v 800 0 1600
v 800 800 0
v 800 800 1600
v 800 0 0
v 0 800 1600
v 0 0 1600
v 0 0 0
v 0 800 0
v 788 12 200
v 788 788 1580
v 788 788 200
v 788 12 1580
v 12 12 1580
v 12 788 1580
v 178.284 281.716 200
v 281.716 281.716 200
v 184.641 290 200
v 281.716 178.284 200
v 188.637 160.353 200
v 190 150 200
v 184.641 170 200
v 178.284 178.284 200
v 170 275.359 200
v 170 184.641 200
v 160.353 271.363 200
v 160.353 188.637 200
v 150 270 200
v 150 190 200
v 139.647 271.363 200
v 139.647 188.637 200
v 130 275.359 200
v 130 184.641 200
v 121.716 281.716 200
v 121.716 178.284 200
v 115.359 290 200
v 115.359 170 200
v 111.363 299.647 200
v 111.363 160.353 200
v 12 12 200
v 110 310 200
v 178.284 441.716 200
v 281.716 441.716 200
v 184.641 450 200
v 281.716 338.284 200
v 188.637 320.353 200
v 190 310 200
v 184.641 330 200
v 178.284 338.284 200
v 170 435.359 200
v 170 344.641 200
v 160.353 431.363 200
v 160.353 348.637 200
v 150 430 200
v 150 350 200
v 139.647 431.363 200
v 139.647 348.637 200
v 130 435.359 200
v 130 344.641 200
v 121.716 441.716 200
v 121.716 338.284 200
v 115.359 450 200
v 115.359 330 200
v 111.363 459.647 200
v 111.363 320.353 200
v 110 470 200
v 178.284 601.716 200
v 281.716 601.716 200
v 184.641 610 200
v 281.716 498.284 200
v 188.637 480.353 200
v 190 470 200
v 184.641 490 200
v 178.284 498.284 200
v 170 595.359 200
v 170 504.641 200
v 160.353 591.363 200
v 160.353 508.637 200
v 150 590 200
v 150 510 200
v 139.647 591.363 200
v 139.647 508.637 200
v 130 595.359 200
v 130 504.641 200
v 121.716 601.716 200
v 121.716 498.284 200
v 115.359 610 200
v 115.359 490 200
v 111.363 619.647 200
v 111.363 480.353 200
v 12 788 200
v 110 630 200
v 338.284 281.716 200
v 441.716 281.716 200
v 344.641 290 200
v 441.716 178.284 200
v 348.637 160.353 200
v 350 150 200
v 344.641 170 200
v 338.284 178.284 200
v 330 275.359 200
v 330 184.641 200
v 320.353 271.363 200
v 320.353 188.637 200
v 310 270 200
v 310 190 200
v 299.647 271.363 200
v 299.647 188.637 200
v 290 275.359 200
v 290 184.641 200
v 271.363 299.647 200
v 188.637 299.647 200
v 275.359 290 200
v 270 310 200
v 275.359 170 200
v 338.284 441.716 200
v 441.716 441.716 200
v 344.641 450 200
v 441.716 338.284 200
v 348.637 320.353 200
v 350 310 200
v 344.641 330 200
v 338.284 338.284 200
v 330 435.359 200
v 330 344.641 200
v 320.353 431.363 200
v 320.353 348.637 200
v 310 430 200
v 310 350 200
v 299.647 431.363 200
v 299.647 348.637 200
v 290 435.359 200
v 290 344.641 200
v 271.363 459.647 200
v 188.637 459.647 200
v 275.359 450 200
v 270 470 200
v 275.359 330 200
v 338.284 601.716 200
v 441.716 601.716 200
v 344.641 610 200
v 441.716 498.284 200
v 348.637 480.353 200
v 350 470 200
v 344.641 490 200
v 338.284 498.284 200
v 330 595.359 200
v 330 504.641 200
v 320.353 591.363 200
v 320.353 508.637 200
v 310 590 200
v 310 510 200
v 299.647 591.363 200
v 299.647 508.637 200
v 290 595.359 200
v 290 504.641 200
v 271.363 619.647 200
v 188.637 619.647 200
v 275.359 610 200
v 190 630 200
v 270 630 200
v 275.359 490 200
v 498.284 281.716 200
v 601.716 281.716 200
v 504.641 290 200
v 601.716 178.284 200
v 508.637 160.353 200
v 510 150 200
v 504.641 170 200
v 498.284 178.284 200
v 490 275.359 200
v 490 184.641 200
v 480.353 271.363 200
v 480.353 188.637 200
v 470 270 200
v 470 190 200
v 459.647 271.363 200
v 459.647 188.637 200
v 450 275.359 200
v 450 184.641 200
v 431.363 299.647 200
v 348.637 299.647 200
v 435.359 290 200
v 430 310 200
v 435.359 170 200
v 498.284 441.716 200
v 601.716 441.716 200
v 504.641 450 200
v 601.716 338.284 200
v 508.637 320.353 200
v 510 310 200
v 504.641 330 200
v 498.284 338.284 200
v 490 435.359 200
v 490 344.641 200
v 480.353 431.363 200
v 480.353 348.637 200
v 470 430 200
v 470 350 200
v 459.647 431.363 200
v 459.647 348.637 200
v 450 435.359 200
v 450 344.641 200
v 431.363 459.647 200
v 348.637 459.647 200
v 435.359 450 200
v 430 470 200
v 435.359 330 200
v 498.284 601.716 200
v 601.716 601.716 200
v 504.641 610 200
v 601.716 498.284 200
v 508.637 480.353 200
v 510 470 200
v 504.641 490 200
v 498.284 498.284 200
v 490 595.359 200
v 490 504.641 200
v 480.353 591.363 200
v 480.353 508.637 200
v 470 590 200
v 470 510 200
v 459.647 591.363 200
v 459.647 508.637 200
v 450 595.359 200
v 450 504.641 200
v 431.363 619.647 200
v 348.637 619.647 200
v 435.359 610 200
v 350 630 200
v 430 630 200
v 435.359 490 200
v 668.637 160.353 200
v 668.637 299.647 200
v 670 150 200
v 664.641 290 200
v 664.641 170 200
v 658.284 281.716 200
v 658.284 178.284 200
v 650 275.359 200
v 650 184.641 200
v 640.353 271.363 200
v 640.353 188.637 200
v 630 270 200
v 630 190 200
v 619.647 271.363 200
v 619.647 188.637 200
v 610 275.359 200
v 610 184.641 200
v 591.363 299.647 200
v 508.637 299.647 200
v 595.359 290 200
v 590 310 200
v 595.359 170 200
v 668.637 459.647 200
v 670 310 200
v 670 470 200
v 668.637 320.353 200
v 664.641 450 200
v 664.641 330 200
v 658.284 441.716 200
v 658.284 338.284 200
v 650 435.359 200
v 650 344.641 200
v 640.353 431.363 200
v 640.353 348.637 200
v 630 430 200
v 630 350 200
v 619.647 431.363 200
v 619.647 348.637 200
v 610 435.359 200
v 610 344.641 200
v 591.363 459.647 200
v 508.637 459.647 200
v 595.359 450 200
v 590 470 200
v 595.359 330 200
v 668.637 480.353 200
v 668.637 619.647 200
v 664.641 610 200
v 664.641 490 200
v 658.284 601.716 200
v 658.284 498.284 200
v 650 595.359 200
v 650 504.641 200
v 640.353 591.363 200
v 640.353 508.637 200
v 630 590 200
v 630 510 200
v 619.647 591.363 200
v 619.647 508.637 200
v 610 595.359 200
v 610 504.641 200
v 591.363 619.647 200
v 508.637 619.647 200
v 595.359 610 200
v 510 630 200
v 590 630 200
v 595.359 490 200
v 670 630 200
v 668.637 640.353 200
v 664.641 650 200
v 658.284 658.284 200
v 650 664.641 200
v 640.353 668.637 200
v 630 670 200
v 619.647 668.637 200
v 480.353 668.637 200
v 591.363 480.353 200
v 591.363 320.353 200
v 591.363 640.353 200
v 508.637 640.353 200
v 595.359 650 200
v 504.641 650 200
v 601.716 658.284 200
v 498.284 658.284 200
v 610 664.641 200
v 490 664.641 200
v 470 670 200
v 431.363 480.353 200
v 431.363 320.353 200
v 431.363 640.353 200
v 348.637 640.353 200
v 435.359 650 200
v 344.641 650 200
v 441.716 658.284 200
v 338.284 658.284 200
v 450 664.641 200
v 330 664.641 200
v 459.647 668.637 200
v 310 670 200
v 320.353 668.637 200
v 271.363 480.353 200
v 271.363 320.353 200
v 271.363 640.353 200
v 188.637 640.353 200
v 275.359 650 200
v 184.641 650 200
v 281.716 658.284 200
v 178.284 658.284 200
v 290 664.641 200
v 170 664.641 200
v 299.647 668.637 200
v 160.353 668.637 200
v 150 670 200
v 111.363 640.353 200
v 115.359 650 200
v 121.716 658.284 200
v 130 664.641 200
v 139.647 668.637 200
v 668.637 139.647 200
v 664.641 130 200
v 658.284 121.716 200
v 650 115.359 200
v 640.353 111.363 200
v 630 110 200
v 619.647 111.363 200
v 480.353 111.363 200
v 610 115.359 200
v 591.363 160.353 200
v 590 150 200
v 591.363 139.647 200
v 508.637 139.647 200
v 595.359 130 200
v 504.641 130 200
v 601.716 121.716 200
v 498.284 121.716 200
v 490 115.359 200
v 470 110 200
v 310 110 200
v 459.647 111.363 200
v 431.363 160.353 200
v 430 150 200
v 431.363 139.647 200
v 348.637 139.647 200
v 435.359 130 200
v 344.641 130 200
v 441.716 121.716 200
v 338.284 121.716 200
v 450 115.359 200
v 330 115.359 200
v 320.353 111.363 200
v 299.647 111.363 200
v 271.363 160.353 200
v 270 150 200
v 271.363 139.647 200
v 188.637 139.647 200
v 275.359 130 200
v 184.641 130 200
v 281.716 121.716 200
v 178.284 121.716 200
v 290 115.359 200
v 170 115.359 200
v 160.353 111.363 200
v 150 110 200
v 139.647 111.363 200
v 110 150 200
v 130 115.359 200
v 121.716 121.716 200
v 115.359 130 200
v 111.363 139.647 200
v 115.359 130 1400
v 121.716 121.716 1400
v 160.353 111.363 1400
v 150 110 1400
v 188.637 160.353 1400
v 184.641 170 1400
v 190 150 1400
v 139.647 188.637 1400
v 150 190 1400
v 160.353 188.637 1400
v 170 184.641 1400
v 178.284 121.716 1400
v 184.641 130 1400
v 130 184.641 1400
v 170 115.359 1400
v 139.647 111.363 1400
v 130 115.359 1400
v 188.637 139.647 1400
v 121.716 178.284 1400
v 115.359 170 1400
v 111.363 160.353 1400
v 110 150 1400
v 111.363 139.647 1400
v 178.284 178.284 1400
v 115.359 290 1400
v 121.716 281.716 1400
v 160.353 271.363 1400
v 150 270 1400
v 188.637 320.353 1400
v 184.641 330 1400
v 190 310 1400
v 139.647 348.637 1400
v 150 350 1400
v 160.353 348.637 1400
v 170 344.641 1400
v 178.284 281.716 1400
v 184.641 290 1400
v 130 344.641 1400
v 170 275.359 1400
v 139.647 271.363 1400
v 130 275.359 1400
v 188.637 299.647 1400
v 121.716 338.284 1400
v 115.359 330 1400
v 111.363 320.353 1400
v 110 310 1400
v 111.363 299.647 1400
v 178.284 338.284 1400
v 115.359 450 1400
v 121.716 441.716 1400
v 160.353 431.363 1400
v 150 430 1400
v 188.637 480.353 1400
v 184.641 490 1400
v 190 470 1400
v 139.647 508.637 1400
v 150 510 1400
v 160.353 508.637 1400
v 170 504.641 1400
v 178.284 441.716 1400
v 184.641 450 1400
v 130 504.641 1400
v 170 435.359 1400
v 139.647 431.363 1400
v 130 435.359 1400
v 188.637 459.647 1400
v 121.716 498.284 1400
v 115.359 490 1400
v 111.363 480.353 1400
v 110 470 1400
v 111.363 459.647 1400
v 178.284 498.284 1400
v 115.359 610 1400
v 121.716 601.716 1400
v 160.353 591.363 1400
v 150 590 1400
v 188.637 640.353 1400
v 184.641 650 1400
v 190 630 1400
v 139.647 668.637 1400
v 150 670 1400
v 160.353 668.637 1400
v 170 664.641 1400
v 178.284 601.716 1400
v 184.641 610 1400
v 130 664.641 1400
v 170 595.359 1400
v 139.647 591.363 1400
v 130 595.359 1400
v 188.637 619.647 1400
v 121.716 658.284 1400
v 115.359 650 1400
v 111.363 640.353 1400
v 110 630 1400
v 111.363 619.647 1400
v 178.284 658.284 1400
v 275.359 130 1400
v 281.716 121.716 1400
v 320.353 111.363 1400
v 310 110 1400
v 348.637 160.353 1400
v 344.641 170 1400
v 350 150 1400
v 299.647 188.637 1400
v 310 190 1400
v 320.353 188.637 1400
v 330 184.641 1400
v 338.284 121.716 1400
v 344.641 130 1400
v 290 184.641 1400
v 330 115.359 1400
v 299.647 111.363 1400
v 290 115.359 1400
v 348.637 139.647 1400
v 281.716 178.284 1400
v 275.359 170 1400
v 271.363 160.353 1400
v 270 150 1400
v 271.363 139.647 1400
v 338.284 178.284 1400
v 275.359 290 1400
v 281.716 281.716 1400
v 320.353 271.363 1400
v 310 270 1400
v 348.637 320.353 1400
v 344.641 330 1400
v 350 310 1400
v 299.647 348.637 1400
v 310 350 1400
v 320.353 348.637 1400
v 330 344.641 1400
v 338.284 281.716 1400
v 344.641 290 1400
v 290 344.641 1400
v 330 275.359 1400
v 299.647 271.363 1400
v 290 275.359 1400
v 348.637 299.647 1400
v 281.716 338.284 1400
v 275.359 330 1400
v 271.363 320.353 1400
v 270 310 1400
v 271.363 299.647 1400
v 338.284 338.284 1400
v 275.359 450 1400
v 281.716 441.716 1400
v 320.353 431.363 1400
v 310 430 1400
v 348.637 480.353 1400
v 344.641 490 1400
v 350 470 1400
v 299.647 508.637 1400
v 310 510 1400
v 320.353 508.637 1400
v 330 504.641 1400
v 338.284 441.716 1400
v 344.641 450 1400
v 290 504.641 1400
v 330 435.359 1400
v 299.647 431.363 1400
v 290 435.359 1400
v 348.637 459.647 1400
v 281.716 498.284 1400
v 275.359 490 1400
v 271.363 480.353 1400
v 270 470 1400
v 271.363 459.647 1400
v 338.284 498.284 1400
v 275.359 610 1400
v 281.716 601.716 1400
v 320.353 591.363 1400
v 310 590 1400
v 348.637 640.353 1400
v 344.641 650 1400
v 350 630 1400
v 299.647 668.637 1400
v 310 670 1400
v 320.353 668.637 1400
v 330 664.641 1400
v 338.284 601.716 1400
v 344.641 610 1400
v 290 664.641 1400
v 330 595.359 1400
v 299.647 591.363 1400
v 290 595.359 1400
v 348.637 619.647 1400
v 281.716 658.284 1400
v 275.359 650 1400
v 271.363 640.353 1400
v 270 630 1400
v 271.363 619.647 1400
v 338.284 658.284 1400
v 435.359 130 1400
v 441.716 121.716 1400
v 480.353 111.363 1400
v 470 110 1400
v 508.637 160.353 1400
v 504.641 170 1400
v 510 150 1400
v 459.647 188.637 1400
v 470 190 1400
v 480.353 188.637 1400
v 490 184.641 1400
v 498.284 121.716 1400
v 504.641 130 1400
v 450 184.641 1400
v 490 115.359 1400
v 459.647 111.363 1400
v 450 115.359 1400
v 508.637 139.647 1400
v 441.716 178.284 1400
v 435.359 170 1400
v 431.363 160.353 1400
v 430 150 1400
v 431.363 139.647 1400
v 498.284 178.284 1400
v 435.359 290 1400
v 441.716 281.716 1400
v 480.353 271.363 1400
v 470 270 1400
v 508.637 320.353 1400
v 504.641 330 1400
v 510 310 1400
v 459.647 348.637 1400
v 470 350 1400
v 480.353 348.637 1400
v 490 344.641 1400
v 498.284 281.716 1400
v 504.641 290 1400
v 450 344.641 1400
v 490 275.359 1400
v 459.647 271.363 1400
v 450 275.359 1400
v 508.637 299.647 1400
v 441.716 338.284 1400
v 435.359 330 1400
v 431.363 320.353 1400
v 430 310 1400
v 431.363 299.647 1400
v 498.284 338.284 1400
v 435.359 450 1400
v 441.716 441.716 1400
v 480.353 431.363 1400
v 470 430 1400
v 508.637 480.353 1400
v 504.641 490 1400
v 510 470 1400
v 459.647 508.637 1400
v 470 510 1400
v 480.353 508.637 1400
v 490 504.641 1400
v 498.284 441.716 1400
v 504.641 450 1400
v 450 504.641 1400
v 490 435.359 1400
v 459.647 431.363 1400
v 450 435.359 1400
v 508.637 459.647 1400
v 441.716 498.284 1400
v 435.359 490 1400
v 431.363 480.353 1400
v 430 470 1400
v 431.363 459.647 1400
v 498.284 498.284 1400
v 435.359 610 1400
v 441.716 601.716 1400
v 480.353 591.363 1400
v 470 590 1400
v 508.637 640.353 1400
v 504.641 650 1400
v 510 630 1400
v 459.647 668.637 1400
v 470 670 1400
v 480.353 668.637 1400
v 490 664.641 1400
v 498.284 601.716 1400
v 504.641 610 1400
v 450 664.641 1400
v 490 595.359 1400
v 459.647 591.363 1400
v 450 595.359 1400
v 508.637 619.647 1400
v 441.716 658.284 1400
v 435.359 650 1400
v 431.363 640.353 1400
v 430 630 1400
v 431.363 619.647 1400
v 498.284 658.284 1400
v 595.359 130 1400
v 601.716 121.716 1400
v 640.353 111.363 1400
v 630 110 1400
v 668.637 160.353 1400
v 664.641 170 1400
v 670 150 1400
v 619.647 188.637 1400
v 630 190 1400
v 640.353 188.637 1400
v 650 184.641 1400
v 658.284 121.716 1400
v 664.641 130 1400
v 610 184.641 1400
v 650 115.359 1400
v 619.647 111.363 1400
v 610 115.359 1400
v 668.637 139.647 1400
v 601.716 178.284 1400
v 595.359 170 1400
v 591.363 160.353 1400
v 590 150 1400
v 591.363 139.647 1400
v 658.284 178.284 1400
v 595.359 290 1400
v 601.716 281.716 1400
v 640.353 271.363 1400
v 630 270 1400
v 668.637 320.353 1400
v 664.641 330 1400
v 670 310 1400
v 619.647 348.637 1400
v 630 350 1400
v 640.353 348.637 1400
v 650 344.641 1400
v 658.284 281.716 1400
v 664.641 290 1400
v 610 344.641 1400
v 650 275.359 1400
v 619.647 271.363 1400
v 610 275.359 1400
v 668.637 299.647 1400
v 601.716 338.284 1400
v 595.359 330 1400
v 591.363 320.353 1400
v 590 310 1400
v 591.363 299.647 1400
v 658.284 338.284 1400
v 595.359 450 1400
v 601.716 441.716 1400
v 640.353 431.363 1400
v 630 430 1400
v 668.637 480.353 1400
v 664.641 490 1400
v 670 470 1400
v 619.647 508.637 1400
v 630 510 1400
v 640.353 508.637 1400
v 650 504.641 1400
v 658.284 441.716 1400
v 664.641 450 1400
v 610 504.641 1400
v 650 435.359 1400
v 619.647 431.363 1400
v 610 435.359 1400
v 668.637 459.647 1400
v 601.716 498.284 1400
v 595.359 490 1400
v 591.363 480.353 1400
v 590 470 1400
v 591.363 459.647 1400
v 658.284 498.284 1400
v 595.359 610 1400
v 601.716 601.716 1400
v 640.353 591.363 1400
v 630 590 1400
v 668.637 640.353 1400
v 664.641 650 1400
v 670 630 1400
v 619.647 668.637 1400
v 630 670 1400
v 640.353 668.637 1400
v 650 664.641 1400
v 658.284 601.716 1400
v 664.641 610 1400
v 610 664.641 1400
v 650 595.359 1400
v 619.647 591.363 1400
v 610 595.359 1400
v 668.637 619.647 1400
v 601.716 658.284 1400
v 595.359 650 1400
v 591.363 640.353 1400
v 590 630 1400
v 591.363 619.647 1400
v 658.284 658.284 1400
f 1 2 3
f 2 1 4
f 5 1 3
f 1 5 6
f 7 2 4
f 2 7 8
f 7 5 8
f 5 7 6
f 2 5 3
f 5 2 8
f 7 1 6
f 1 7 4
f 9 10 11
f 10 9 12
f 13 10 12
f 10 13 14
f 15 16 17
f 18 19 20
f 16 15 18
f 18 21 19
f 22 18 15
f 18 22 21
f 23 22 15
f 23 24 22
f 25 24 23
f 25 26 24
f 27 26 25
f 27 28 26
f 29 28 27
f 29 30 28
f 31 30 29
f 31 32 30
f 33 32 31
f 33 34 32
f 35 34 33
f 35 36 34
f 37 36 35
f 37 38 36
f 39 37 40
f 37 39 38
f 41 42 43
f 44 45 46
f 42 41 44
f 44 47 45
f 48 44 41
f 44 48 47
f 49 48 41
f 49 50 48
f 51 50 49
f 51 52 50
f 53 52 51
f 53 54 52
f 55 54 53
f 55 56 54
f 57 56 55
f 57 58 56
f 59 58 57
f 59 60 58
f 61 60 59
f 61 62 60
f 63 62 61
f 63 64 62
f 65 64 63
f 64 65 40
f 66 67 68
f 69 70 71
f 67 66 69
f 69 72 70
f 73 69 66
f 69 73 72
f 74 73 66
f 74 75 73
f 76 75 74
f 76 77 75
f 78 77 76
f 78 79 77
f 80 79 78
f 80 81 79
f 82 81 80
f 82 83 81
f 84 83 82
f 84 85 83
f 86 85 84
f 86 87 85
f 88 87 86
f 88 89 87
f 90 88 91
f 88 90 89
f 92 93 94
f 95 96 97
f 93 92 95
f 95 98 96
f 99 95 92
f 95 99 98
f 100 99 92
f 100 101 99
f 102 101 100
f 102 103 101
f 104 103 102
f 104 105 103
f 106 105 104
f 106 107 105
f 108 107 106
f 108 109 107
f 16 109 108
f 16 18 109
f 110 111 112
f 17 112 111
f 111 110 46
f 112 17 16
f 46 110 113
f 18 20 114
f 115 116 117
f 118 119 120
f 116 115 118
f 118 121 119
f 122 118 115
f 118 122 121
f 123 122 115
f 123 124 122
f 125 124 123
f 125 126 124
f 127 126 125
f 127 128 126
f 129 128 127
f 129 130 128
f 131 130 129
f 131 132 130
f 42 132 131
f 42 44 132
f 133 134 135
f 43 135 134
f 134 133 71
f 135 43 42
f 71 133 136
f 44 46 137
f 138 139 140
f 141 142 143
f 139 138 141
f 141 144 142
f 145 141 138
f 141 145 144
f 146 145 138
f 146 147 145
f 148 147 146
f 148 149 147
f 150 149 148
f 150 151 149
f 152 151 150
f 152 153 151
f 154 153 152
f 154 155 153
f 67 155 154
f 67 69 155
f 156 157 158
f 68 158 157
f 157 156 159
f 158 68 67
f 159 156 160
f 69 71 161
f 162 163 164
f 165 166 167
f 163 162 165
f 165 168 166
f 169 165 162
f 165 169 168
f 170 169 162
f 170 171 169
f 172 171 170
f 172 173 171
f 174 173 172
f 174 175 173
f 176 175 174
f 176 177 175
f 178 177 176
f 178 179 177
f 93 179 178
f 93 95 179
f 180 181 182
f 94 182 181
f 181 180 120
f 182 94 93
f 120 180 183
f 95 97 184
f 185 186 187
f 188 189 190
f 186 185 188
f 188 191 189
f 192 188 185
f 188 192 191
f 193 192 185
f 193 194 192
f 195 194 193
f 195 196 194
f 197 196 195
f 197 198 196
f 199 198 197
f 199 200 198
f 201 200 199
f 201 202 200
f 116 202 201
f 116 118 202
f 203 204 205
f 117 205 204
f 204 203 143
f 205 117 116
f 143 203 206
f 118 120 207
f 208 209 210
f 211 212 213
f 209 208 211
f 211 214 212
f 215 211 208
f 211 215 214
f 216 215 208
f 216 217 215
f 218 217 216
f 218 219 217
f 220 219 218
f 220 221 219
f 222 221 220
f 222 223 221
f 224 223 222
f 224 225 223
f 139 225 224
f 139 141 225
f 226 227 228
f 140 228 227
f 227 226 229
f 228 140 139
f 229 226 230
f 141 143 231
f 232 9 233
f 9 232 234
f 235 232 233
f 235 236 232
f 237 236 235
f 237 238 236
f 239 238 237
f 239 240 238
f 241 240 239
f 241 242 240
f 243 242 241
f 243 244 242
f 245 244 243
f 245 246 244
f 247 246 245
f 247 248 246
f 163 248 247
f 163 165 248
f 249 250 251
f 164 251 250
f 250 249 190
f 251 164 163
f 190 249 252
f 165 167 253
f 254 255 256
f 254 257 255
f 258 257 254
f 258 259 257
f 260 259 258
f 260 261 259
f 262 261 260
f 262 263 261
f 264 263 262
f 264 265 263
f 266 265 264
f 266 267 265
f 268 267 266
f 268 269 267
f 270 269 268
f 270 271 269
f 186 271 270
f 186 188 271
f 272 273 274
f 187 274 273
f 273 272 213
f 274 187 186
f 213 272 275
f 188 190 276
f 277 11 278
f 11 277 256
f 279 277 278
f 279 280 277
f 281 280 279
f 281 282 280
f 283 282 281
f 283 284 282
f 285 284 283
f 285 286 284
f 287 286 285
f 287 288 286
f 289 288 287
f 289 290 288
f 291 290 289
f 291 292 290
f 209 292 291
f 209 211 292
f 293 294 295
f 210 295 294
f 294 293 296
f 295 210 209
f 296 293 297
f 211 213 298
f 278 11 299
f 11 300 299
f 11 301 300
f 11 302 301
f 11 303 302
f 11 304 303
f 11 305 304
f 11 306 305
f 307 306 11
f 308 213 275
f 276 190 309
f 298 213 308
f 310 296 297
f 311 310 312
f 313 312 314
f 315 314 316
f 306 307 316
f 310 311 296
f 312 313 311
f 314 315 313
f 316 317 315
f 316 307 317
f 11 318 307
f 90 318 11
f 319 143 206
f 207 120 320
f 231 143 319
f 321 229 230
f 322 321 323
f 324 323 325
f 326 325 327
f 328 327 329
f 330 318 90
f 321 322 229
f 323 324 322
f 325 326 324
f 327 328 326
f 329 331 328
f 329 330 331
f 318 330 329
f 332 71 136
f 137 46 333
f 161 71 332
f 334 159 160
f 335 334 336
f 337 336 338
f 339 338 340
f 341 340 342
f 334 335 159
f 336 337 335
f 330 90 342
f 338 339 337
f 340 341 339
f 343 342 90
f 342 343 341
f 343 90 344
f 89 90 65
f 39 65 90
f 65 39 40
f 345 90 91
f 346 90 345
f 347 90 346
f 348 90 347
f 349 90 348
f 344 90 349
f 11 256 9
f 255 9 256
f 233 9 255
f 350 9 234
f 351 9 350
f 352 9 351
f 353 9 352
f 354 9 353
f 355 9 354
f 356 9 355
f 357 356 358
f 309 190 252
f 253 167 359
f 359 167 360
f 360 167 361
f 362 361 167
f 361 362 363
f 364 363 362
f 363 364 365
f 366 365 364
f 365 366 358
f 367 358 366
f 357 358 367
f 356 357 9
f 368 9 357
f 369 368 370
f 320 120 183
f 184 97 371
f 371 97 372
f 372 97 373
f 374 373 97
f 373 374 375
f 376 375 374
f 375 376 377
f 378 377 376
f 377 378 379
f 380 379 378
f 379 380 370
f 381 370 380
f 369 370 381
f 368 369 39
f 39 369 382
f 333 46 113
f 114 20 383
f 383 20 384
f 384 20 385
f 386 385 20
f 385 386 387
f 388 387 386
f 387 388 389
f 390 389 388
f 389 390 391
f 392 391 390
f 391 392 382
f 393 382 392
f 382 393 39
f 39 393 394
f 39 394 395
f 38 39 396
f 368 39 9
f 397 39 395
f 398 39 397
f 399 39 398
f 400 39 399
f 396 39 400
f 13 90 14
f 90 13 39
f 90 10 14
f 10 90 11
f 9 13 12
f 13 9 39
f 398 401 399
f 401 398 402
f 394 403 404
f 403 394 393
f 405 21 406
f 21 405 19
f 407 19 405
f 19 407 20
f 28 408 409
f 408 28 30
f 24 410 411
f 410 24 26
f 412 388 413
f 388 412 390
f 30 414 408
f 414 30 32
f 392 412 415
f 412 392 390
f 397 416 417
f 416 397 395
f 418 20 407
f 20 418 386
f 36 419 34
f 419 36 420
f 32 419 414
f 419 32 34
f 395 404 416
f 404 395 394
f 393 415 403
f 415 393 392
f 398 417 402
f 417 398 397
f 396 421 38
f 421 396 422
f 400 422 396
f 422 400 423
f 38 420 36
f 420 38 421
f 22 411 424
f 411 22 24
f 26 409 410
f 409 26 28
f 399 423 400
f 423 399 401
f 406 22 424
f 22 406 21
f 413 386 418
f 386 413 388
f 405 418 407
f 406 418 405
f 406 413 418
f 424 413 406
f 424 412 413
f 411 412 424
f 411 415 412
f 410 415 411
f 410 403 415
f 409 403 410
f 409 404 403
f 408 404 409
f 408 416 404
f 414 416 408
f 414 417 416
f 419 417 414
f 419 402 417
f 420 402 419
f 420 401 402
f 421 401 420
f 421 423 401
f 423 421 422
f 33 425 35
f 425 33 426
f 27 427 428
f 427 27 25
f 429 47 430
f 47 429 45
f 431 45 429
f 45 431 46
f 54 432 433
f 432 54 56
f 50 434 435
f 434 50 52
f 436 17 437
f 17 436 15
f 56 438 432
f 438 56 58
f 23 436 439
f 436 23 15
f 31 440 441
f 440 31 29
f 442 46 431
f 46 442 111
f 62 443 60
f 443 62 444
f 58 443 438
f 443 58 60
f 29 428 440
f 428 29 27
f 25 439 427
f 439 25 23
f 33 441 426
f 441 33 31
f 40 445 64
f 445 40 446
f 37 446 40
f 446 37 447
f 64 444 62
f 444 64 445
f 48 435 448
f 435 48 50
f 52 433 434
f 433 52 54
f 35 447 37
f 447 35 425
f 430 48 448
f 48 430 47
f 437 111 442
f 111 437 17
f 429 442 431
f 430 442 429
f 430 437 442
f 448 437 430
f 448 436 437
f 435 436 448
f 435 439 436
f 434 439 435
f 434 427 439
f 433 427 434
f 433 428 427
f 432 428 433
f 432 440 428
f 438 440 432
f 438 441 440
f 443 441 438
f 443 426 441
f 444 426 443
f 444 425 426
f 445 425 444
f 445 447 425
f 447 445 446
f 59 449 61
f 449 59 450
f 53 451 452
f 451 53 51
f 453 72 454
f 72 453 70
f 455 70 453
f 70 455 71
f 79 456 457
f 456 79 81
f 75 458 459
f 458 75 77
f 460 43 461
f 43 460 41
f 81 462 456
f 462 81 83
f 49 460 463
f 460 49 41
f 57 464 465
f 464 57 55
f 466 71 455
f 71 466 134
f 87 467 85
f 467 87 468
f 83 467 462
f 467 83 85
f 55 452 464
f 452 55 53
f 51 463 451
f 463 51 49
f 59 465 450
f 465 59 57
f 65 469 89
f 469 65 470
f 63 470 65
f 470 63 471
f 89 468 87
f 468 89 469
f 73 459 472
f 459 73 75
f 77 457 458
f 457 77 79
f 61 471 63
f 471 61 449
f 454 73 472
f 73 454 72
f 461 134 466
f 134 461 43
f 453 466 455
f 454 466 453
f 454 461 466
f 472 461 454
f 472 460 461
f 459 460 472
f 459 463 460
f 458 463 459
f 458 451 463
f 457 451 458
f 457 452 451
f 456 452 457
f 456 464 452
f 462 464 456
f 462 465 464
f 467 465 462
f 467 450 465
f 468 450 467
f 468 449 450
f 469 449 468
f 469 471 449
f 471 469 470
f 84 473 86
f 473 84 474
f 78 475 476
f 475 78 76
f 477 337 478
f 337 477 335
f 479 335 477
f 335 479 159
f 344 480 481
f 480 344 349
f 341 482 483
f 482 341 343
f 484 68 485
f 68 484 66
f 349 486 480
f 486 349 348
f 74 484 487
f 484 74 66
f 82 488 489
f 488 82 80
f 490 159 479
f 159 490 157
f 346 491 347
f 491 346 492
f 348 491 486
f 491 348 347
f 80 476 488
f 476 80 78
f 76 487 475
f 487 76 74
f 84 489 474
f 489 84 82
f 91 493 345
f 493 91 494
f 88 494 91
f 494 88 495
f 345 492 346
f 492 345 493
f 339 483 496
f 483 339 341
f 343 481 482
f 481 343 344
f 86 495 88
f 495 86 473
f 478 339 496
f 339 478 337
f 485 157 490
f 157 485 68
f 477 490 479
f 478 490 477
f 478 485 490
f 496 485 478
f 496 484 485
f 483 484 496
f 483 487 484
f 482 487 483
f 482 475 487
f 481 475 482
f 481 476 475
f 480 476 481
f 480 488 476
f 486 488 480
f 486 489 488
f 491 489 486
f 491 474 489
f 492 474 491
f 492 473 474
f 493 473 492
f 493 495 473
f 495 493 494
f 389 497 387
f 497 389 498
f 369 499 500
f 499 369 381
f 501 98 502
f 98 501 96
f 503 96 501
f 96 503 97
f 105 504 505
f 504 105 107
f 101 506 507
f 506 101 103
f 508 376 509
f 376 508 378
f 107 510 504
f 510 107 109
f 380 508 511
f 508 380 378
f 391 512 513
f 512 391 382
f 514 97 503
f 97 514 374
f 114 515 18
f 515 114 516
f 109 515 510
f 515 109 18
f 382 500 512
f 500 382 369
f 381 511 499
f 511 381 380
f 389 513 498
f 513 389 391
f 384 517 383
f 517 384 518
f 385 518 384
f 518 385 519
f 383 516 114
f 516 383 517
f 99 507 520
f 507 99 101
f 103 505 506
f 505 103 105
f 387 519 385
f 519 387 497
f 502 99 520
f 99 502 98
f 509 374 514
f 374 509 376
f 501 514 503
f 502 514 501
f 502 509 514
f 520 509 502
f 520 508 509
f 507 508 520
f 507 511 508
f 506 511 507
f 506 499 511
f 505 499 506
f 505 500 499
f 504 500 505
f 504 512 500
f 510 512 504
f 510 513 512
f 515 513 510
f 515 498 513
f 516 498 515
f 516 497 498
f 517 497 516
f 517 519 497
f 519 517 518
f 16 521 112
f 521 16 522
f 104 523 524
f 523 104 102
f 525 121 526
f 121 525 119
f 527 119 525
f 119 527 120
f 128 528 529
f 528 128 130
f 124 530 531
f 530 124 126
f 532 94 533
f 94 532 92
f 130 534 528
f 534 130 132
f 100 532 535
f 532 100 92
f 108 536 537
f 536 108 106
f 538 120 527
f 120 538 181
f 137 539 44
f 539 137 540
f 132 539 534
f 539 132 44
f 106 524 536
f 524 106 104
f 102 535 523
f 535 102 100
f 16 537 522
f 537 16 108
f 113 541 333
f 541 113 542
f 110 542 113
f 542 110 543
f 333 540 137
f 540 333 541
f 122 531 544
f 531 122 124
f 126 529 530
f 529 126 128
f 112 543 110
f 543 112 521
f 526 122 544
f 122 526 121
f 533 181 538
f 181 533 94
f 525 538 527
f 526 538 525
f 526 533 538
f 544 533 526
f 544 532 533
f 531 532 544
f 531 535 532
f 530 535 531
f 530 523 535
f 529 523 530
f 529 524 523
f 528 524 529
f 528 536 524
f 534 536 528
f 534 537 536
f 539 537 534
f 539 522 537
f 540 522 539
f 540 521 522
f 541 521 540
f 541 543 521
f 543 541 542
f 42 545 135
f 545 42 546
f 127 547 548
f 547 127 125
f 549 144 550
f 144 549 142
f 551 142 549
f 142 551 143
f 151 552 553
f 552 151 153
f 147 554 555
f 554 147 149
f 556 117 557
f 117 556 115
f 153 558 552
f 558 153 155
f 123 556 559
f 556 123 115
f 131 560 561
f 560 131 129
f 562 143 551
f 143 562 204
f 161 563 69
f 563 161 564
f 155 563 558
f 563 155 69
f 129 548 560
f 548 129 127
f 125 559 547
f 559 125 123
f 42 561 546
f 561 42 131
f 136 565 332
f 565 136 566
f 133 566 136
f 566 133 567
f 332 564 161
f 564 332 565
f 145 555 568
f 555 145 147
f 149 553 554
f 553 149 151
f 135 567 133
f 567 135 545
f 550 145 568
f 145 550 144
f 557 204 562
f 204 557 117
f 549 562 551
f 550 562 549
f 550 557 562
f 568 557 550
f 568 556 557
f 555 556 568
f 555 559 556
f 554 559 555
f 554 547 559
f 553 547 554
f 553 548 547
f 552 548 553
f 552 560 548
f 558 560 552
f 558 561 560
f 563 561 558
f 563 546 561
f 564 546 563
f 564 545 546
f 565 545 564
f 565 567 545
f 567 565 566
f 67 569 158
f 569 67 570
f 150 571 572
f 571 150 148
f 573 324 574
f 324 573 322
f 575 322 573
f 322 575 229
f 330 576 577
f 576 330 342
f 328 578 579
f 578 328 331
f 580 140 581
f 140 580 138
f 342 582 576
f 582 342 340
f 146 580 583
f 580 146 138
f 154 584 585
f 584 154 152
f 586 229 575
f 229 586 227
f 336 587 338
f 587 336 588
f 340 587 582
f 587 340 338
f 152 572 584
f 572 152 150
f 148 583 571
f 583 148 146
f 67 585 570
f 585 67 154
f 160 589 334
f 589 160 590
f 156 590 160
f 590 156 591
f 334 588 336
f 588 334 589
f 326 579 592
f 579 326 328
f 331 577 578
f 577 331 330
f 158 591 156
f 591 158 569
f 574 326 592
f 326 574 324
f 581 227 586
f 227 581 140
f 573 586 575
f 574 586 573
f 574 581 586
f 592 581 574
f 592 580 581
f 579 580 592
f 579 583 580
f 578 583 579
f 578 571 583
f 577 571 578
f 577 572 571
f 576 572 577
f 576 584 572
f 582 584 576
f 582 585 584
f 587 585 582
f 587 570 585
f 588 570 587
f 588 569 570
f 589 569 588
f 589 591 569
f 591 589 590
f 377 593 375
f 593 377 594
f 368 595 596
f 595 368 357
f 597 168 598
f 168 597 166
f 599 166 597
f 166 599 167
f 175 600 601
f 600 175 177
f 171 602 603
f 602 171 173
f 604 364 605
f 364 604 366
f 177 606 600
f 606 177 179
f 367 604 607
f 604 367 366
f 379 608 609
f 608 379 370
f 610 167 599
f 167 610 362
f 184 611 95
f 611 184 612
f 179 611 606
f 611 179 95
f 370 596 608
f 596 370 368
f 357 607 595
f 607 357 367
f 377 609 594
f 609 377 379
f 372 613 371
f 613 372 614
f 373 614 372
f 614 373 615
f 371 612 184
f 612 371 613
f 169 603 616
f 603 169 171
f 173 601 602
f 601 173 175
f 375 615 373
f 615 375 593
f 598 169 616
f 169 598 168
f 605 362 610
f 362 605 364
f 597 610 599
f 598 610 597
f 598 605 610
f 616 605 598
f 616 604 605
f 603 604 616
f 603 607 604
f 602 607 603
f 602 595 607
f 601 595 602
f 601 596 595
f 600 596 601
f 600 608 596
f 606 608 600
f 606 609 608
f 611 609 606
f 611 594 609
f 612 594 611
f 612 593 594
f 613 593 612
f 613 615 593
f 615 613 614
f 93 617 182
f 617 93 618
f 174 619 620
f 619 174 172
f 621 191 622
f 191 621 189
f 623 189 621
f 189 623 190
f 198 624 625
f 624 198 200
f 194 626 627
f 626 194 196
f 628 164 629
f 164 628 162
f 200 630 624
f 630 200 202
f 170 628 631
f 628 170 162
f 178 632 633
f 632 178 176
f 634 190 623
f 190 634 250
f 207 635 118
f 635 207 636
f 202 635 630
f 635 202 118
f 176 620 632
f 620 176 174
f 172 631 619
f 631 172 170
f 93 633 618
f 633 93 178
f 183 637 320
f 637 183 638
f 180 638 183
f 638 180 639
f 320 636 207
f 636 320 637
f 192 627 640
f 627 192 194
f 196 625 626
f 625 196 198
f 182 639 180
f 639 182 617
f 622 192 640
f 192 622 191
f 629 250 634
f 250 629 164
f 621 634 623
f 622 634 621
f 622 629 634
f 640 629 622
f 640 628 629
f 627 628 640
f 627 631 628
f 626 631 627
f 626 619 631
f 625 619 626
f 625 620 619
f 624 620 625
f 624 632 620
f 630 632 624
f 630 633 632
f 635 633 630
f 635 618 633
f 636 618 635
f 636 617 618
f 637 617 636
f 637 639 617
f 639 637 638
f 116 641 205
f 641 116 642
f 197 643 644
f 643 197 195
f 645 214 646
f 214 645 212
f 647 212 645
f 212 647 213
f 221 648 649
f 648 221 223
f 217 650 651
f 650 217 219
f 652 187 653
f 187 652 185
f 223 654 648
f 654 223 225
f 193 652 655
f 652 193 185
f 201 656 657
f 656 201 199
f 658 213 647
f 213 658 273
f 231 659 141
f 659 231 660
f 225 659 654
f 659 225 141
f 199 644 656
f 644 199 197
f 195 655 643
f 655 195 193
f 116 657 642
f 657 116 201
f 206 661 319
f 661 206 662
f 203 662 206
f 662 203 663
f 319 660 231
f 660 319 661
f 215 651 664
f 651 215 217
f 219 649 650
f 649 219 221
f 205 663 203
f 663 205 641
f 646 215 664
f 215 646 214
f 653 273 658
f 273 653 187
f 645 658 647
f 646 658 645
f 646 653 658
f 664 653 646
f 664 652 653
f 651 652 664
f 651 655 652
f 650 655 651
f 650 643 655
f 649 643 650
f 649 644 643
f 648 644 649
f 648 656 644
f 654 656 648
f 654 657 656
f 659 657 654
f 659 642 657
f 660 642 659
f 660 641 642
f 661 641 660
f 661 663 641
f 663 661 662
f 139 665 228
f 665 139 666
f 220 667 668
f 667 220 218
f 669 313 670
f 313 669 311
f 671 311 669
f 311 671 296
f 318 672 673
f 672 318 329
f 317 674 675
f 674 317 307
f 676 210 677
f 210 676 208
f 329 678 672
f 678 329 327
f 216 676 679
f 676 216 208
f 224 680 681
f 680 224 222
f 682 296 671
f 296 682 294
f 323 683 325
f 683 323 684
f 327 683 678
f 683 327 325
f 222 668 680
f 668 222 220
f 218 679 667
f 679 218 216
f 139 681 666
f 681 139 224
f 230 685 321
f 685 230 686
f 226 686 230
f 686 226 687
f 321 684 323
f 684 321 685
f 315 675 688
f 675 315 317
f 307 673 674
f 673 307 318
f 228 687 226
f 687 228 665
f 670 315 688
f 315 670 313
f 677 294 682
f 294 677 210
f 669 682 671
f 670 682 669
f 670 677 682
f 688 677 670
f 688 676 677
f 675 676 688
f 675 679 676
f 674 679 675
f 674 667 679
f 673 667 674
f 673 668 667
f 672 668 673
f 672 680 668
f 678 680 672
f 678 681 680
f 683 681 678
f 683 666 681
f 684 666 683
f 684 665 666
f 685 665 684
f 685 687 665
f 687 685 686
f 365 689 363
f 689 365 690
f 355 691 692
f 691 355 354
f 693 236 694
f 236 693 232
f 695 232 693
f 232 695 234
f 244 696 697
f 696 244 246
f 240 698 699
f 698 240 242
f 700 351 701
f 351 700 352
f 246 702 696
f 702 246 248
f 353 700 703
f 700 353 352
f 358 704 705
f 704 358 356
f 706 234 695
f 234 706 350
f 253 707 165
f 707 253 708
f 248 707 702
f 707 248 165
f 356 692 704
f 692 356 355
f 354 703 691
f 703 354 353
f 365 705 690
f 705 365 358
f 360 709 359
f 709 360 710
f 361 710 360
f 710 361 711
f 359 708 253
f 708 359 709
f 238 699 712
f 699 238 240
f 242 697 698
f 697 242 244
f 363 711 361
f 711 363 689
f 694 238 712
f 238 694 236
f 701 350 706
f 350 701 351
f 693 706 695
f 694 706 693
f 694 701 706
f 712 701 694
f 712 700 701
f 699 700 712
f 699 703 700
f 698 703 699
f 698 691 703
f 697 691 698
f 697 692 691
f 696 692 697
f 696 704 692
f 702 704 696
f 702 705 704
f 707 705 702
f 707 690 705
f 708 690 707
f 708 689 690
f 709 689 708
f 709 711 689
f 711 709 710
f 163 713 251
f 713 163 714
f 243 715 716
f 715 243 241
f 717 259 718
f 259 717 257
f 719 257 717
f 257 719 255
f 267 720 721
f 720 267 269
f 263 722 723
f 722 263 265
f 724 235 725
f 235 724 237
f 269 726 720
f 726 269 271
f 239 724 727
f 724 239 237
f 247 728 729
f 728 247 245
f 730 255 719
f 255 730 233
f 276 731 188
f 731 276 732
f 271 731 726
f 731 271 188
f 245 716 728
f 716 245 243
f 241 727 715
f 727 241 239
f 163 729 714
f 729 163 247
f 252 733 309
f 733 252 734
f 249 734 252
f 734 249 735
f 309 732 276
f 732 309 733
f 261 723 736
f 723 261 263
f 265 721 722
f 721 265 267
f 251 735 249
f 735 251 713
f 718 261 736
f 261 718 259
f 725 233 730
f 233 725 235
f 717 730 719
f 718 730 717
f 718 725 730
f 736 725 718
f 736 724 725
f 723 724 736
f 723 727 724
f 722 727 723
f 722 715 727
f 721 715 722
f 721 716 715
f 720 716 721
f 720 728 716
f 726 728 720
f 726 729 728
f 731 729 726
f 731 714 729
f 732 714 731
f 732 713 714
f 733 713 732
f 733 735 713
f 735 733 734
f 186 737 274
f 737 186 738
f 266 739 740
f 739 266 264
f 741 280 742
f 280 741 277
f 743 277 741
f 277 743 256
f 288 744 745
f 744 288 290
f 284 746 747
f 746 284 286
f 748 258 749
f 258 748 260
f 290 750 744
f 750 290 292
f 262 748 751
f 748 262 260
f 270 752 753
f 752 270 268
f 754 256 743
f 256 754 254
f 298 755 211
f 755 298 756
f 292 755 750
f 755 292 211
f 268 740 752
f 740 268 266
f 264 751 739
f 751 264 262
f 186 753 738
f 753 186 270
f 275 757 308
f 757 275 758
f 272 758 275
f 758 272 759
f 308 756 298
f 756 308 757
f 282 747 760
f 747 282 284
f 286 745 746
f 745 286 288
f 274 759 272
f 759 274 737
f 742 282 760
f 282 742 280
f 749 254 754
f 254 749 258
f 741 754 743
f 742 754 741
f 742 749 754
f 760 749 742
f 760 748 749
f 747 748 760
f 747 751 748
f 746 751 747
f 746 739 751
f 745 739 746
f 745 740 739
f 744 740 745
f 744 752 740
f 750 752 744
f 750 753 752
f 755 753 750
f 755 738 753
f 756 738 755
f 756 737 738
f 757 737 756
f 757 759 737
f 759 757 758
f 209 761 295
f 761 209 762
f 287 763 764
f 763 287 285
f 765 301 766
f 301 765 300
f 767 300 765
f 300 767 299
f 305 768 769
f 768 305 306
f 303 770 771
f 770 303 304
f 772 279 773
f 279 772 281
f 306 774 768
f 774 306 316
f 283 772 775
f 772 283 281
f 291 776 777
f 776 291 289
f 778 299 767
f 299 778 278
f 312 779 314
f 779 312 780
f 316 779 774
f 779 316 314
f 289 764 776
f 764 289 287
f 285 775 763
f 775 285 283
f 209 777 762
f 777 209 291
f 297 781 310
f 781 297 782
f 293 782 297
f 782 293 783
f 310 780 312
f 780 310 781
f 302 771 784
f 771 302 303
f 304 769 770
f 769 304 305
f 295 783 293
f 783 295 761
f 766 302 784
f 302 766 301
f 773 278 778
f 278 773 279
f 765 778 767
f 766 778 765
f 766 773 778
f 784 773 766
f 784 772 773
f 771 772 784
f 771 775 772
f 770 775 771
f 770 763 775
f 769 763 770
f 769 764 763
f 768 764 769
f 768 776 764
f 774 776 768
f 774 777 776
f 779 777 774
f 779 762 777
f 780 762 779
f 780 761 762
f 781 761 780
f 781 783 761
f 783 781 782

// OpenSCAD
// file: ../params.scad
// Shared millimetre parameters. Keep in lockstep with freecad/params.py.
// Module scale: 150 kg/day wet train. Walls are CPVC sheet, not metal.

$fn = 36;

WALL        = 12;     // CPVC sheet thickness
FLOOR       = 16;     // floor plate (trough sits on this)

// LEACH CSTR 1 — inside liquor box
CSTR_L      = 2000;
CSTR_W      = 1200;
CSTR_H      = 1400;   // liquid + freeboard
FREEBOARD   = 200;

// CSTR 2 weir (same vessel, +X wall)
WEIR_W      = 450;
WEIR_CREST  = CSTR_H - FREEBOARD;   // from inner floor
WEIR_SLOT_H = 80;
WEIR_LIP    = 120;    // external spout projection

// CSTR 3 floor auger — injection-molded PVC / FG
AUGER_D     = 140;    // flight OD
AUGER_SHAFT = 40;
AUGER_PITCH = 110;
AUGER_TROUGH_W = 180;
AUGER_TROUGH_H = 110;
AUGER_OFFSET_Y = 280; // trough centreline from inner -Y wall
AUGER_INCLINE  = 28;  // deg, lifts out of liquor toward +X

// mixer / nozzles (lid)
MIXER_D     = 50;
GAS_D       = 80;     // acid-gas takeoff
DROP_X      = 80;     // inner-X of shred drop slot
DROP_L      = 400;
DROP_W      = 250;
DROP_COAM   = 80;     // raised coaming around the slot

// LEACHATE PUMP / coarse strainer — −X wall, opposite the weir
PUMP_D      = 80;     // DN80
PUMP_Z      = 450;    // centreline above inner floor (submerged)
PUMP_Y      = 900;    // centreline from inner −Y (away from auger)
STRAINER_L  = 180;
STRAINER_W  = 140;
STRAINER_H  = 160;

// mezzanine feed train
MEZZ_H      = 2200;   // platform top above tank outer floor
MEZZ_L      = 1600;   // platform length in −X
MEZZ_THK    = 12;
HOPPER_L    = 700;
HOPPER_W    = 600;
HOPPER_H    = 800;
SHRED_L     = 500;
SHRED_W     = 500;
SHRED_H     = 450;
CONV_W      = 240;
CONV_H      = 120;
CONV_PLATE  = 6;      // trough plate
CONV_FLANGE = 40;
CONV_SPRING_D = 50;
CONV_SPRING_H = 80;
CONV_BOLT   = 10;     // M10 clearance
CONV_LEN    = 1800;   // default standalone length; plant instance is computed
DUST_D      = 150;    // dust-hood outlet to DUST header
AUGER_LIFT_L = 700;

// dewater belts + split (Phase A 4–6)
FDEW_L      = 1800;
FDEW_W      = 450;
FDEW_H      = 80;
FDEW_RISE   = 120;    // solids end higher so liquor runs back to weir
SDEW_L      = 1400;
SDEW_W      = 220;
SDEW_H      = 80;
SPLIT_L     = 600;
SPLIT_W     = 500;
SPLIT_H     = 400;
STUB_L      = 400;
STUB_W      = 300;
STUB_H      = 250;

// EW funnel cell
EW_L        = 600;    // along aisle (overflow direction)
EW_W        = 420;    // anode-cathode depth
EW_H        = 650;    // rectangular body
EW_FUNNEL_H = 220;
EW_VALVE_D  = 50;
EW_VALVE_L  = 60;
EW_MEM_T    = 4;      // CEM
EW_SLOT     = 10;     // membrane cassette slot
EW_PITCH    = 750;    // aisle spacing, centre to centre
AISLE_X0    = 200;
AISLE_Y     = -(EW_W + 2*WALL) - 400;
AISLE_Z     = 400;
BUND_H      = 150;
BUND_PAD    = 250;
SUMP_L      = 400;
SUMP_W      = 400;
SUMP_H      = 300;
VDF_D       = 700;
VDF_L       = 900;
PAIL_W      = 180;
HDR_D       = 80;
HDR_Z       = 1400;
PYRO_D      = 320;
PYRO_L      = 2800;

// Campus envelopes — lockstep with freecad/params.py
FARM_X=12000; FARM_Y=8000; FARM_L=12000; FARM_W=8000; FARM_H=4500;
FAB_X=12000;  FAB_Y=-6000; FAB_L=8000;   FAB_W=6000;  FAB_H=4000;
HAB_X=-8000;  HAB_Y=8000;  HAB_L=8000;   HAB_W=6000;  HAB_H=3200;
CRYO_X=-6000; CRYO_Y=-4000; CRYO_L=4000; CRYO_W=3000; CRYO_H=3000;
MFG_X=2000;   MFG_Y=9000;  MFG_L=6000;   MFG_W=4000;  MFG_H=3500;

LIFE_Z_GREY=900; LIFE_Z_UPW=1100; LIFE_Z_ETCH=1300;
LIFE_Z_O2=2800; LIFE_Z_N2=3000; LIFE_Z_CO2=3200;
LIFE_D_GREY=50; LIFE_D_UPW=40; LIFE_D_ETCH=32;
LIFE_D_GAS=25; LIFE_D_CO2=40;
// main file
// 8.2 BAGHOUSE. Fines return to CSTR 1.
include <../params.scad>;
$fn = 24;

module mfg_baghouse() {
    difference() {
        cube([800, 800, 1600]);
        translate([12, 12, 200]) cube([776, 776, 1380]);
    }
    for (x = [150:160:650])
        for (y = [150:160:650])
            translate([x, y, 200])
                cylinder(h=1200, d=80);
    translate([400, 400, 0])
        cylinder(h=80, d=DUST_D);
}
mfg_baghouse();
